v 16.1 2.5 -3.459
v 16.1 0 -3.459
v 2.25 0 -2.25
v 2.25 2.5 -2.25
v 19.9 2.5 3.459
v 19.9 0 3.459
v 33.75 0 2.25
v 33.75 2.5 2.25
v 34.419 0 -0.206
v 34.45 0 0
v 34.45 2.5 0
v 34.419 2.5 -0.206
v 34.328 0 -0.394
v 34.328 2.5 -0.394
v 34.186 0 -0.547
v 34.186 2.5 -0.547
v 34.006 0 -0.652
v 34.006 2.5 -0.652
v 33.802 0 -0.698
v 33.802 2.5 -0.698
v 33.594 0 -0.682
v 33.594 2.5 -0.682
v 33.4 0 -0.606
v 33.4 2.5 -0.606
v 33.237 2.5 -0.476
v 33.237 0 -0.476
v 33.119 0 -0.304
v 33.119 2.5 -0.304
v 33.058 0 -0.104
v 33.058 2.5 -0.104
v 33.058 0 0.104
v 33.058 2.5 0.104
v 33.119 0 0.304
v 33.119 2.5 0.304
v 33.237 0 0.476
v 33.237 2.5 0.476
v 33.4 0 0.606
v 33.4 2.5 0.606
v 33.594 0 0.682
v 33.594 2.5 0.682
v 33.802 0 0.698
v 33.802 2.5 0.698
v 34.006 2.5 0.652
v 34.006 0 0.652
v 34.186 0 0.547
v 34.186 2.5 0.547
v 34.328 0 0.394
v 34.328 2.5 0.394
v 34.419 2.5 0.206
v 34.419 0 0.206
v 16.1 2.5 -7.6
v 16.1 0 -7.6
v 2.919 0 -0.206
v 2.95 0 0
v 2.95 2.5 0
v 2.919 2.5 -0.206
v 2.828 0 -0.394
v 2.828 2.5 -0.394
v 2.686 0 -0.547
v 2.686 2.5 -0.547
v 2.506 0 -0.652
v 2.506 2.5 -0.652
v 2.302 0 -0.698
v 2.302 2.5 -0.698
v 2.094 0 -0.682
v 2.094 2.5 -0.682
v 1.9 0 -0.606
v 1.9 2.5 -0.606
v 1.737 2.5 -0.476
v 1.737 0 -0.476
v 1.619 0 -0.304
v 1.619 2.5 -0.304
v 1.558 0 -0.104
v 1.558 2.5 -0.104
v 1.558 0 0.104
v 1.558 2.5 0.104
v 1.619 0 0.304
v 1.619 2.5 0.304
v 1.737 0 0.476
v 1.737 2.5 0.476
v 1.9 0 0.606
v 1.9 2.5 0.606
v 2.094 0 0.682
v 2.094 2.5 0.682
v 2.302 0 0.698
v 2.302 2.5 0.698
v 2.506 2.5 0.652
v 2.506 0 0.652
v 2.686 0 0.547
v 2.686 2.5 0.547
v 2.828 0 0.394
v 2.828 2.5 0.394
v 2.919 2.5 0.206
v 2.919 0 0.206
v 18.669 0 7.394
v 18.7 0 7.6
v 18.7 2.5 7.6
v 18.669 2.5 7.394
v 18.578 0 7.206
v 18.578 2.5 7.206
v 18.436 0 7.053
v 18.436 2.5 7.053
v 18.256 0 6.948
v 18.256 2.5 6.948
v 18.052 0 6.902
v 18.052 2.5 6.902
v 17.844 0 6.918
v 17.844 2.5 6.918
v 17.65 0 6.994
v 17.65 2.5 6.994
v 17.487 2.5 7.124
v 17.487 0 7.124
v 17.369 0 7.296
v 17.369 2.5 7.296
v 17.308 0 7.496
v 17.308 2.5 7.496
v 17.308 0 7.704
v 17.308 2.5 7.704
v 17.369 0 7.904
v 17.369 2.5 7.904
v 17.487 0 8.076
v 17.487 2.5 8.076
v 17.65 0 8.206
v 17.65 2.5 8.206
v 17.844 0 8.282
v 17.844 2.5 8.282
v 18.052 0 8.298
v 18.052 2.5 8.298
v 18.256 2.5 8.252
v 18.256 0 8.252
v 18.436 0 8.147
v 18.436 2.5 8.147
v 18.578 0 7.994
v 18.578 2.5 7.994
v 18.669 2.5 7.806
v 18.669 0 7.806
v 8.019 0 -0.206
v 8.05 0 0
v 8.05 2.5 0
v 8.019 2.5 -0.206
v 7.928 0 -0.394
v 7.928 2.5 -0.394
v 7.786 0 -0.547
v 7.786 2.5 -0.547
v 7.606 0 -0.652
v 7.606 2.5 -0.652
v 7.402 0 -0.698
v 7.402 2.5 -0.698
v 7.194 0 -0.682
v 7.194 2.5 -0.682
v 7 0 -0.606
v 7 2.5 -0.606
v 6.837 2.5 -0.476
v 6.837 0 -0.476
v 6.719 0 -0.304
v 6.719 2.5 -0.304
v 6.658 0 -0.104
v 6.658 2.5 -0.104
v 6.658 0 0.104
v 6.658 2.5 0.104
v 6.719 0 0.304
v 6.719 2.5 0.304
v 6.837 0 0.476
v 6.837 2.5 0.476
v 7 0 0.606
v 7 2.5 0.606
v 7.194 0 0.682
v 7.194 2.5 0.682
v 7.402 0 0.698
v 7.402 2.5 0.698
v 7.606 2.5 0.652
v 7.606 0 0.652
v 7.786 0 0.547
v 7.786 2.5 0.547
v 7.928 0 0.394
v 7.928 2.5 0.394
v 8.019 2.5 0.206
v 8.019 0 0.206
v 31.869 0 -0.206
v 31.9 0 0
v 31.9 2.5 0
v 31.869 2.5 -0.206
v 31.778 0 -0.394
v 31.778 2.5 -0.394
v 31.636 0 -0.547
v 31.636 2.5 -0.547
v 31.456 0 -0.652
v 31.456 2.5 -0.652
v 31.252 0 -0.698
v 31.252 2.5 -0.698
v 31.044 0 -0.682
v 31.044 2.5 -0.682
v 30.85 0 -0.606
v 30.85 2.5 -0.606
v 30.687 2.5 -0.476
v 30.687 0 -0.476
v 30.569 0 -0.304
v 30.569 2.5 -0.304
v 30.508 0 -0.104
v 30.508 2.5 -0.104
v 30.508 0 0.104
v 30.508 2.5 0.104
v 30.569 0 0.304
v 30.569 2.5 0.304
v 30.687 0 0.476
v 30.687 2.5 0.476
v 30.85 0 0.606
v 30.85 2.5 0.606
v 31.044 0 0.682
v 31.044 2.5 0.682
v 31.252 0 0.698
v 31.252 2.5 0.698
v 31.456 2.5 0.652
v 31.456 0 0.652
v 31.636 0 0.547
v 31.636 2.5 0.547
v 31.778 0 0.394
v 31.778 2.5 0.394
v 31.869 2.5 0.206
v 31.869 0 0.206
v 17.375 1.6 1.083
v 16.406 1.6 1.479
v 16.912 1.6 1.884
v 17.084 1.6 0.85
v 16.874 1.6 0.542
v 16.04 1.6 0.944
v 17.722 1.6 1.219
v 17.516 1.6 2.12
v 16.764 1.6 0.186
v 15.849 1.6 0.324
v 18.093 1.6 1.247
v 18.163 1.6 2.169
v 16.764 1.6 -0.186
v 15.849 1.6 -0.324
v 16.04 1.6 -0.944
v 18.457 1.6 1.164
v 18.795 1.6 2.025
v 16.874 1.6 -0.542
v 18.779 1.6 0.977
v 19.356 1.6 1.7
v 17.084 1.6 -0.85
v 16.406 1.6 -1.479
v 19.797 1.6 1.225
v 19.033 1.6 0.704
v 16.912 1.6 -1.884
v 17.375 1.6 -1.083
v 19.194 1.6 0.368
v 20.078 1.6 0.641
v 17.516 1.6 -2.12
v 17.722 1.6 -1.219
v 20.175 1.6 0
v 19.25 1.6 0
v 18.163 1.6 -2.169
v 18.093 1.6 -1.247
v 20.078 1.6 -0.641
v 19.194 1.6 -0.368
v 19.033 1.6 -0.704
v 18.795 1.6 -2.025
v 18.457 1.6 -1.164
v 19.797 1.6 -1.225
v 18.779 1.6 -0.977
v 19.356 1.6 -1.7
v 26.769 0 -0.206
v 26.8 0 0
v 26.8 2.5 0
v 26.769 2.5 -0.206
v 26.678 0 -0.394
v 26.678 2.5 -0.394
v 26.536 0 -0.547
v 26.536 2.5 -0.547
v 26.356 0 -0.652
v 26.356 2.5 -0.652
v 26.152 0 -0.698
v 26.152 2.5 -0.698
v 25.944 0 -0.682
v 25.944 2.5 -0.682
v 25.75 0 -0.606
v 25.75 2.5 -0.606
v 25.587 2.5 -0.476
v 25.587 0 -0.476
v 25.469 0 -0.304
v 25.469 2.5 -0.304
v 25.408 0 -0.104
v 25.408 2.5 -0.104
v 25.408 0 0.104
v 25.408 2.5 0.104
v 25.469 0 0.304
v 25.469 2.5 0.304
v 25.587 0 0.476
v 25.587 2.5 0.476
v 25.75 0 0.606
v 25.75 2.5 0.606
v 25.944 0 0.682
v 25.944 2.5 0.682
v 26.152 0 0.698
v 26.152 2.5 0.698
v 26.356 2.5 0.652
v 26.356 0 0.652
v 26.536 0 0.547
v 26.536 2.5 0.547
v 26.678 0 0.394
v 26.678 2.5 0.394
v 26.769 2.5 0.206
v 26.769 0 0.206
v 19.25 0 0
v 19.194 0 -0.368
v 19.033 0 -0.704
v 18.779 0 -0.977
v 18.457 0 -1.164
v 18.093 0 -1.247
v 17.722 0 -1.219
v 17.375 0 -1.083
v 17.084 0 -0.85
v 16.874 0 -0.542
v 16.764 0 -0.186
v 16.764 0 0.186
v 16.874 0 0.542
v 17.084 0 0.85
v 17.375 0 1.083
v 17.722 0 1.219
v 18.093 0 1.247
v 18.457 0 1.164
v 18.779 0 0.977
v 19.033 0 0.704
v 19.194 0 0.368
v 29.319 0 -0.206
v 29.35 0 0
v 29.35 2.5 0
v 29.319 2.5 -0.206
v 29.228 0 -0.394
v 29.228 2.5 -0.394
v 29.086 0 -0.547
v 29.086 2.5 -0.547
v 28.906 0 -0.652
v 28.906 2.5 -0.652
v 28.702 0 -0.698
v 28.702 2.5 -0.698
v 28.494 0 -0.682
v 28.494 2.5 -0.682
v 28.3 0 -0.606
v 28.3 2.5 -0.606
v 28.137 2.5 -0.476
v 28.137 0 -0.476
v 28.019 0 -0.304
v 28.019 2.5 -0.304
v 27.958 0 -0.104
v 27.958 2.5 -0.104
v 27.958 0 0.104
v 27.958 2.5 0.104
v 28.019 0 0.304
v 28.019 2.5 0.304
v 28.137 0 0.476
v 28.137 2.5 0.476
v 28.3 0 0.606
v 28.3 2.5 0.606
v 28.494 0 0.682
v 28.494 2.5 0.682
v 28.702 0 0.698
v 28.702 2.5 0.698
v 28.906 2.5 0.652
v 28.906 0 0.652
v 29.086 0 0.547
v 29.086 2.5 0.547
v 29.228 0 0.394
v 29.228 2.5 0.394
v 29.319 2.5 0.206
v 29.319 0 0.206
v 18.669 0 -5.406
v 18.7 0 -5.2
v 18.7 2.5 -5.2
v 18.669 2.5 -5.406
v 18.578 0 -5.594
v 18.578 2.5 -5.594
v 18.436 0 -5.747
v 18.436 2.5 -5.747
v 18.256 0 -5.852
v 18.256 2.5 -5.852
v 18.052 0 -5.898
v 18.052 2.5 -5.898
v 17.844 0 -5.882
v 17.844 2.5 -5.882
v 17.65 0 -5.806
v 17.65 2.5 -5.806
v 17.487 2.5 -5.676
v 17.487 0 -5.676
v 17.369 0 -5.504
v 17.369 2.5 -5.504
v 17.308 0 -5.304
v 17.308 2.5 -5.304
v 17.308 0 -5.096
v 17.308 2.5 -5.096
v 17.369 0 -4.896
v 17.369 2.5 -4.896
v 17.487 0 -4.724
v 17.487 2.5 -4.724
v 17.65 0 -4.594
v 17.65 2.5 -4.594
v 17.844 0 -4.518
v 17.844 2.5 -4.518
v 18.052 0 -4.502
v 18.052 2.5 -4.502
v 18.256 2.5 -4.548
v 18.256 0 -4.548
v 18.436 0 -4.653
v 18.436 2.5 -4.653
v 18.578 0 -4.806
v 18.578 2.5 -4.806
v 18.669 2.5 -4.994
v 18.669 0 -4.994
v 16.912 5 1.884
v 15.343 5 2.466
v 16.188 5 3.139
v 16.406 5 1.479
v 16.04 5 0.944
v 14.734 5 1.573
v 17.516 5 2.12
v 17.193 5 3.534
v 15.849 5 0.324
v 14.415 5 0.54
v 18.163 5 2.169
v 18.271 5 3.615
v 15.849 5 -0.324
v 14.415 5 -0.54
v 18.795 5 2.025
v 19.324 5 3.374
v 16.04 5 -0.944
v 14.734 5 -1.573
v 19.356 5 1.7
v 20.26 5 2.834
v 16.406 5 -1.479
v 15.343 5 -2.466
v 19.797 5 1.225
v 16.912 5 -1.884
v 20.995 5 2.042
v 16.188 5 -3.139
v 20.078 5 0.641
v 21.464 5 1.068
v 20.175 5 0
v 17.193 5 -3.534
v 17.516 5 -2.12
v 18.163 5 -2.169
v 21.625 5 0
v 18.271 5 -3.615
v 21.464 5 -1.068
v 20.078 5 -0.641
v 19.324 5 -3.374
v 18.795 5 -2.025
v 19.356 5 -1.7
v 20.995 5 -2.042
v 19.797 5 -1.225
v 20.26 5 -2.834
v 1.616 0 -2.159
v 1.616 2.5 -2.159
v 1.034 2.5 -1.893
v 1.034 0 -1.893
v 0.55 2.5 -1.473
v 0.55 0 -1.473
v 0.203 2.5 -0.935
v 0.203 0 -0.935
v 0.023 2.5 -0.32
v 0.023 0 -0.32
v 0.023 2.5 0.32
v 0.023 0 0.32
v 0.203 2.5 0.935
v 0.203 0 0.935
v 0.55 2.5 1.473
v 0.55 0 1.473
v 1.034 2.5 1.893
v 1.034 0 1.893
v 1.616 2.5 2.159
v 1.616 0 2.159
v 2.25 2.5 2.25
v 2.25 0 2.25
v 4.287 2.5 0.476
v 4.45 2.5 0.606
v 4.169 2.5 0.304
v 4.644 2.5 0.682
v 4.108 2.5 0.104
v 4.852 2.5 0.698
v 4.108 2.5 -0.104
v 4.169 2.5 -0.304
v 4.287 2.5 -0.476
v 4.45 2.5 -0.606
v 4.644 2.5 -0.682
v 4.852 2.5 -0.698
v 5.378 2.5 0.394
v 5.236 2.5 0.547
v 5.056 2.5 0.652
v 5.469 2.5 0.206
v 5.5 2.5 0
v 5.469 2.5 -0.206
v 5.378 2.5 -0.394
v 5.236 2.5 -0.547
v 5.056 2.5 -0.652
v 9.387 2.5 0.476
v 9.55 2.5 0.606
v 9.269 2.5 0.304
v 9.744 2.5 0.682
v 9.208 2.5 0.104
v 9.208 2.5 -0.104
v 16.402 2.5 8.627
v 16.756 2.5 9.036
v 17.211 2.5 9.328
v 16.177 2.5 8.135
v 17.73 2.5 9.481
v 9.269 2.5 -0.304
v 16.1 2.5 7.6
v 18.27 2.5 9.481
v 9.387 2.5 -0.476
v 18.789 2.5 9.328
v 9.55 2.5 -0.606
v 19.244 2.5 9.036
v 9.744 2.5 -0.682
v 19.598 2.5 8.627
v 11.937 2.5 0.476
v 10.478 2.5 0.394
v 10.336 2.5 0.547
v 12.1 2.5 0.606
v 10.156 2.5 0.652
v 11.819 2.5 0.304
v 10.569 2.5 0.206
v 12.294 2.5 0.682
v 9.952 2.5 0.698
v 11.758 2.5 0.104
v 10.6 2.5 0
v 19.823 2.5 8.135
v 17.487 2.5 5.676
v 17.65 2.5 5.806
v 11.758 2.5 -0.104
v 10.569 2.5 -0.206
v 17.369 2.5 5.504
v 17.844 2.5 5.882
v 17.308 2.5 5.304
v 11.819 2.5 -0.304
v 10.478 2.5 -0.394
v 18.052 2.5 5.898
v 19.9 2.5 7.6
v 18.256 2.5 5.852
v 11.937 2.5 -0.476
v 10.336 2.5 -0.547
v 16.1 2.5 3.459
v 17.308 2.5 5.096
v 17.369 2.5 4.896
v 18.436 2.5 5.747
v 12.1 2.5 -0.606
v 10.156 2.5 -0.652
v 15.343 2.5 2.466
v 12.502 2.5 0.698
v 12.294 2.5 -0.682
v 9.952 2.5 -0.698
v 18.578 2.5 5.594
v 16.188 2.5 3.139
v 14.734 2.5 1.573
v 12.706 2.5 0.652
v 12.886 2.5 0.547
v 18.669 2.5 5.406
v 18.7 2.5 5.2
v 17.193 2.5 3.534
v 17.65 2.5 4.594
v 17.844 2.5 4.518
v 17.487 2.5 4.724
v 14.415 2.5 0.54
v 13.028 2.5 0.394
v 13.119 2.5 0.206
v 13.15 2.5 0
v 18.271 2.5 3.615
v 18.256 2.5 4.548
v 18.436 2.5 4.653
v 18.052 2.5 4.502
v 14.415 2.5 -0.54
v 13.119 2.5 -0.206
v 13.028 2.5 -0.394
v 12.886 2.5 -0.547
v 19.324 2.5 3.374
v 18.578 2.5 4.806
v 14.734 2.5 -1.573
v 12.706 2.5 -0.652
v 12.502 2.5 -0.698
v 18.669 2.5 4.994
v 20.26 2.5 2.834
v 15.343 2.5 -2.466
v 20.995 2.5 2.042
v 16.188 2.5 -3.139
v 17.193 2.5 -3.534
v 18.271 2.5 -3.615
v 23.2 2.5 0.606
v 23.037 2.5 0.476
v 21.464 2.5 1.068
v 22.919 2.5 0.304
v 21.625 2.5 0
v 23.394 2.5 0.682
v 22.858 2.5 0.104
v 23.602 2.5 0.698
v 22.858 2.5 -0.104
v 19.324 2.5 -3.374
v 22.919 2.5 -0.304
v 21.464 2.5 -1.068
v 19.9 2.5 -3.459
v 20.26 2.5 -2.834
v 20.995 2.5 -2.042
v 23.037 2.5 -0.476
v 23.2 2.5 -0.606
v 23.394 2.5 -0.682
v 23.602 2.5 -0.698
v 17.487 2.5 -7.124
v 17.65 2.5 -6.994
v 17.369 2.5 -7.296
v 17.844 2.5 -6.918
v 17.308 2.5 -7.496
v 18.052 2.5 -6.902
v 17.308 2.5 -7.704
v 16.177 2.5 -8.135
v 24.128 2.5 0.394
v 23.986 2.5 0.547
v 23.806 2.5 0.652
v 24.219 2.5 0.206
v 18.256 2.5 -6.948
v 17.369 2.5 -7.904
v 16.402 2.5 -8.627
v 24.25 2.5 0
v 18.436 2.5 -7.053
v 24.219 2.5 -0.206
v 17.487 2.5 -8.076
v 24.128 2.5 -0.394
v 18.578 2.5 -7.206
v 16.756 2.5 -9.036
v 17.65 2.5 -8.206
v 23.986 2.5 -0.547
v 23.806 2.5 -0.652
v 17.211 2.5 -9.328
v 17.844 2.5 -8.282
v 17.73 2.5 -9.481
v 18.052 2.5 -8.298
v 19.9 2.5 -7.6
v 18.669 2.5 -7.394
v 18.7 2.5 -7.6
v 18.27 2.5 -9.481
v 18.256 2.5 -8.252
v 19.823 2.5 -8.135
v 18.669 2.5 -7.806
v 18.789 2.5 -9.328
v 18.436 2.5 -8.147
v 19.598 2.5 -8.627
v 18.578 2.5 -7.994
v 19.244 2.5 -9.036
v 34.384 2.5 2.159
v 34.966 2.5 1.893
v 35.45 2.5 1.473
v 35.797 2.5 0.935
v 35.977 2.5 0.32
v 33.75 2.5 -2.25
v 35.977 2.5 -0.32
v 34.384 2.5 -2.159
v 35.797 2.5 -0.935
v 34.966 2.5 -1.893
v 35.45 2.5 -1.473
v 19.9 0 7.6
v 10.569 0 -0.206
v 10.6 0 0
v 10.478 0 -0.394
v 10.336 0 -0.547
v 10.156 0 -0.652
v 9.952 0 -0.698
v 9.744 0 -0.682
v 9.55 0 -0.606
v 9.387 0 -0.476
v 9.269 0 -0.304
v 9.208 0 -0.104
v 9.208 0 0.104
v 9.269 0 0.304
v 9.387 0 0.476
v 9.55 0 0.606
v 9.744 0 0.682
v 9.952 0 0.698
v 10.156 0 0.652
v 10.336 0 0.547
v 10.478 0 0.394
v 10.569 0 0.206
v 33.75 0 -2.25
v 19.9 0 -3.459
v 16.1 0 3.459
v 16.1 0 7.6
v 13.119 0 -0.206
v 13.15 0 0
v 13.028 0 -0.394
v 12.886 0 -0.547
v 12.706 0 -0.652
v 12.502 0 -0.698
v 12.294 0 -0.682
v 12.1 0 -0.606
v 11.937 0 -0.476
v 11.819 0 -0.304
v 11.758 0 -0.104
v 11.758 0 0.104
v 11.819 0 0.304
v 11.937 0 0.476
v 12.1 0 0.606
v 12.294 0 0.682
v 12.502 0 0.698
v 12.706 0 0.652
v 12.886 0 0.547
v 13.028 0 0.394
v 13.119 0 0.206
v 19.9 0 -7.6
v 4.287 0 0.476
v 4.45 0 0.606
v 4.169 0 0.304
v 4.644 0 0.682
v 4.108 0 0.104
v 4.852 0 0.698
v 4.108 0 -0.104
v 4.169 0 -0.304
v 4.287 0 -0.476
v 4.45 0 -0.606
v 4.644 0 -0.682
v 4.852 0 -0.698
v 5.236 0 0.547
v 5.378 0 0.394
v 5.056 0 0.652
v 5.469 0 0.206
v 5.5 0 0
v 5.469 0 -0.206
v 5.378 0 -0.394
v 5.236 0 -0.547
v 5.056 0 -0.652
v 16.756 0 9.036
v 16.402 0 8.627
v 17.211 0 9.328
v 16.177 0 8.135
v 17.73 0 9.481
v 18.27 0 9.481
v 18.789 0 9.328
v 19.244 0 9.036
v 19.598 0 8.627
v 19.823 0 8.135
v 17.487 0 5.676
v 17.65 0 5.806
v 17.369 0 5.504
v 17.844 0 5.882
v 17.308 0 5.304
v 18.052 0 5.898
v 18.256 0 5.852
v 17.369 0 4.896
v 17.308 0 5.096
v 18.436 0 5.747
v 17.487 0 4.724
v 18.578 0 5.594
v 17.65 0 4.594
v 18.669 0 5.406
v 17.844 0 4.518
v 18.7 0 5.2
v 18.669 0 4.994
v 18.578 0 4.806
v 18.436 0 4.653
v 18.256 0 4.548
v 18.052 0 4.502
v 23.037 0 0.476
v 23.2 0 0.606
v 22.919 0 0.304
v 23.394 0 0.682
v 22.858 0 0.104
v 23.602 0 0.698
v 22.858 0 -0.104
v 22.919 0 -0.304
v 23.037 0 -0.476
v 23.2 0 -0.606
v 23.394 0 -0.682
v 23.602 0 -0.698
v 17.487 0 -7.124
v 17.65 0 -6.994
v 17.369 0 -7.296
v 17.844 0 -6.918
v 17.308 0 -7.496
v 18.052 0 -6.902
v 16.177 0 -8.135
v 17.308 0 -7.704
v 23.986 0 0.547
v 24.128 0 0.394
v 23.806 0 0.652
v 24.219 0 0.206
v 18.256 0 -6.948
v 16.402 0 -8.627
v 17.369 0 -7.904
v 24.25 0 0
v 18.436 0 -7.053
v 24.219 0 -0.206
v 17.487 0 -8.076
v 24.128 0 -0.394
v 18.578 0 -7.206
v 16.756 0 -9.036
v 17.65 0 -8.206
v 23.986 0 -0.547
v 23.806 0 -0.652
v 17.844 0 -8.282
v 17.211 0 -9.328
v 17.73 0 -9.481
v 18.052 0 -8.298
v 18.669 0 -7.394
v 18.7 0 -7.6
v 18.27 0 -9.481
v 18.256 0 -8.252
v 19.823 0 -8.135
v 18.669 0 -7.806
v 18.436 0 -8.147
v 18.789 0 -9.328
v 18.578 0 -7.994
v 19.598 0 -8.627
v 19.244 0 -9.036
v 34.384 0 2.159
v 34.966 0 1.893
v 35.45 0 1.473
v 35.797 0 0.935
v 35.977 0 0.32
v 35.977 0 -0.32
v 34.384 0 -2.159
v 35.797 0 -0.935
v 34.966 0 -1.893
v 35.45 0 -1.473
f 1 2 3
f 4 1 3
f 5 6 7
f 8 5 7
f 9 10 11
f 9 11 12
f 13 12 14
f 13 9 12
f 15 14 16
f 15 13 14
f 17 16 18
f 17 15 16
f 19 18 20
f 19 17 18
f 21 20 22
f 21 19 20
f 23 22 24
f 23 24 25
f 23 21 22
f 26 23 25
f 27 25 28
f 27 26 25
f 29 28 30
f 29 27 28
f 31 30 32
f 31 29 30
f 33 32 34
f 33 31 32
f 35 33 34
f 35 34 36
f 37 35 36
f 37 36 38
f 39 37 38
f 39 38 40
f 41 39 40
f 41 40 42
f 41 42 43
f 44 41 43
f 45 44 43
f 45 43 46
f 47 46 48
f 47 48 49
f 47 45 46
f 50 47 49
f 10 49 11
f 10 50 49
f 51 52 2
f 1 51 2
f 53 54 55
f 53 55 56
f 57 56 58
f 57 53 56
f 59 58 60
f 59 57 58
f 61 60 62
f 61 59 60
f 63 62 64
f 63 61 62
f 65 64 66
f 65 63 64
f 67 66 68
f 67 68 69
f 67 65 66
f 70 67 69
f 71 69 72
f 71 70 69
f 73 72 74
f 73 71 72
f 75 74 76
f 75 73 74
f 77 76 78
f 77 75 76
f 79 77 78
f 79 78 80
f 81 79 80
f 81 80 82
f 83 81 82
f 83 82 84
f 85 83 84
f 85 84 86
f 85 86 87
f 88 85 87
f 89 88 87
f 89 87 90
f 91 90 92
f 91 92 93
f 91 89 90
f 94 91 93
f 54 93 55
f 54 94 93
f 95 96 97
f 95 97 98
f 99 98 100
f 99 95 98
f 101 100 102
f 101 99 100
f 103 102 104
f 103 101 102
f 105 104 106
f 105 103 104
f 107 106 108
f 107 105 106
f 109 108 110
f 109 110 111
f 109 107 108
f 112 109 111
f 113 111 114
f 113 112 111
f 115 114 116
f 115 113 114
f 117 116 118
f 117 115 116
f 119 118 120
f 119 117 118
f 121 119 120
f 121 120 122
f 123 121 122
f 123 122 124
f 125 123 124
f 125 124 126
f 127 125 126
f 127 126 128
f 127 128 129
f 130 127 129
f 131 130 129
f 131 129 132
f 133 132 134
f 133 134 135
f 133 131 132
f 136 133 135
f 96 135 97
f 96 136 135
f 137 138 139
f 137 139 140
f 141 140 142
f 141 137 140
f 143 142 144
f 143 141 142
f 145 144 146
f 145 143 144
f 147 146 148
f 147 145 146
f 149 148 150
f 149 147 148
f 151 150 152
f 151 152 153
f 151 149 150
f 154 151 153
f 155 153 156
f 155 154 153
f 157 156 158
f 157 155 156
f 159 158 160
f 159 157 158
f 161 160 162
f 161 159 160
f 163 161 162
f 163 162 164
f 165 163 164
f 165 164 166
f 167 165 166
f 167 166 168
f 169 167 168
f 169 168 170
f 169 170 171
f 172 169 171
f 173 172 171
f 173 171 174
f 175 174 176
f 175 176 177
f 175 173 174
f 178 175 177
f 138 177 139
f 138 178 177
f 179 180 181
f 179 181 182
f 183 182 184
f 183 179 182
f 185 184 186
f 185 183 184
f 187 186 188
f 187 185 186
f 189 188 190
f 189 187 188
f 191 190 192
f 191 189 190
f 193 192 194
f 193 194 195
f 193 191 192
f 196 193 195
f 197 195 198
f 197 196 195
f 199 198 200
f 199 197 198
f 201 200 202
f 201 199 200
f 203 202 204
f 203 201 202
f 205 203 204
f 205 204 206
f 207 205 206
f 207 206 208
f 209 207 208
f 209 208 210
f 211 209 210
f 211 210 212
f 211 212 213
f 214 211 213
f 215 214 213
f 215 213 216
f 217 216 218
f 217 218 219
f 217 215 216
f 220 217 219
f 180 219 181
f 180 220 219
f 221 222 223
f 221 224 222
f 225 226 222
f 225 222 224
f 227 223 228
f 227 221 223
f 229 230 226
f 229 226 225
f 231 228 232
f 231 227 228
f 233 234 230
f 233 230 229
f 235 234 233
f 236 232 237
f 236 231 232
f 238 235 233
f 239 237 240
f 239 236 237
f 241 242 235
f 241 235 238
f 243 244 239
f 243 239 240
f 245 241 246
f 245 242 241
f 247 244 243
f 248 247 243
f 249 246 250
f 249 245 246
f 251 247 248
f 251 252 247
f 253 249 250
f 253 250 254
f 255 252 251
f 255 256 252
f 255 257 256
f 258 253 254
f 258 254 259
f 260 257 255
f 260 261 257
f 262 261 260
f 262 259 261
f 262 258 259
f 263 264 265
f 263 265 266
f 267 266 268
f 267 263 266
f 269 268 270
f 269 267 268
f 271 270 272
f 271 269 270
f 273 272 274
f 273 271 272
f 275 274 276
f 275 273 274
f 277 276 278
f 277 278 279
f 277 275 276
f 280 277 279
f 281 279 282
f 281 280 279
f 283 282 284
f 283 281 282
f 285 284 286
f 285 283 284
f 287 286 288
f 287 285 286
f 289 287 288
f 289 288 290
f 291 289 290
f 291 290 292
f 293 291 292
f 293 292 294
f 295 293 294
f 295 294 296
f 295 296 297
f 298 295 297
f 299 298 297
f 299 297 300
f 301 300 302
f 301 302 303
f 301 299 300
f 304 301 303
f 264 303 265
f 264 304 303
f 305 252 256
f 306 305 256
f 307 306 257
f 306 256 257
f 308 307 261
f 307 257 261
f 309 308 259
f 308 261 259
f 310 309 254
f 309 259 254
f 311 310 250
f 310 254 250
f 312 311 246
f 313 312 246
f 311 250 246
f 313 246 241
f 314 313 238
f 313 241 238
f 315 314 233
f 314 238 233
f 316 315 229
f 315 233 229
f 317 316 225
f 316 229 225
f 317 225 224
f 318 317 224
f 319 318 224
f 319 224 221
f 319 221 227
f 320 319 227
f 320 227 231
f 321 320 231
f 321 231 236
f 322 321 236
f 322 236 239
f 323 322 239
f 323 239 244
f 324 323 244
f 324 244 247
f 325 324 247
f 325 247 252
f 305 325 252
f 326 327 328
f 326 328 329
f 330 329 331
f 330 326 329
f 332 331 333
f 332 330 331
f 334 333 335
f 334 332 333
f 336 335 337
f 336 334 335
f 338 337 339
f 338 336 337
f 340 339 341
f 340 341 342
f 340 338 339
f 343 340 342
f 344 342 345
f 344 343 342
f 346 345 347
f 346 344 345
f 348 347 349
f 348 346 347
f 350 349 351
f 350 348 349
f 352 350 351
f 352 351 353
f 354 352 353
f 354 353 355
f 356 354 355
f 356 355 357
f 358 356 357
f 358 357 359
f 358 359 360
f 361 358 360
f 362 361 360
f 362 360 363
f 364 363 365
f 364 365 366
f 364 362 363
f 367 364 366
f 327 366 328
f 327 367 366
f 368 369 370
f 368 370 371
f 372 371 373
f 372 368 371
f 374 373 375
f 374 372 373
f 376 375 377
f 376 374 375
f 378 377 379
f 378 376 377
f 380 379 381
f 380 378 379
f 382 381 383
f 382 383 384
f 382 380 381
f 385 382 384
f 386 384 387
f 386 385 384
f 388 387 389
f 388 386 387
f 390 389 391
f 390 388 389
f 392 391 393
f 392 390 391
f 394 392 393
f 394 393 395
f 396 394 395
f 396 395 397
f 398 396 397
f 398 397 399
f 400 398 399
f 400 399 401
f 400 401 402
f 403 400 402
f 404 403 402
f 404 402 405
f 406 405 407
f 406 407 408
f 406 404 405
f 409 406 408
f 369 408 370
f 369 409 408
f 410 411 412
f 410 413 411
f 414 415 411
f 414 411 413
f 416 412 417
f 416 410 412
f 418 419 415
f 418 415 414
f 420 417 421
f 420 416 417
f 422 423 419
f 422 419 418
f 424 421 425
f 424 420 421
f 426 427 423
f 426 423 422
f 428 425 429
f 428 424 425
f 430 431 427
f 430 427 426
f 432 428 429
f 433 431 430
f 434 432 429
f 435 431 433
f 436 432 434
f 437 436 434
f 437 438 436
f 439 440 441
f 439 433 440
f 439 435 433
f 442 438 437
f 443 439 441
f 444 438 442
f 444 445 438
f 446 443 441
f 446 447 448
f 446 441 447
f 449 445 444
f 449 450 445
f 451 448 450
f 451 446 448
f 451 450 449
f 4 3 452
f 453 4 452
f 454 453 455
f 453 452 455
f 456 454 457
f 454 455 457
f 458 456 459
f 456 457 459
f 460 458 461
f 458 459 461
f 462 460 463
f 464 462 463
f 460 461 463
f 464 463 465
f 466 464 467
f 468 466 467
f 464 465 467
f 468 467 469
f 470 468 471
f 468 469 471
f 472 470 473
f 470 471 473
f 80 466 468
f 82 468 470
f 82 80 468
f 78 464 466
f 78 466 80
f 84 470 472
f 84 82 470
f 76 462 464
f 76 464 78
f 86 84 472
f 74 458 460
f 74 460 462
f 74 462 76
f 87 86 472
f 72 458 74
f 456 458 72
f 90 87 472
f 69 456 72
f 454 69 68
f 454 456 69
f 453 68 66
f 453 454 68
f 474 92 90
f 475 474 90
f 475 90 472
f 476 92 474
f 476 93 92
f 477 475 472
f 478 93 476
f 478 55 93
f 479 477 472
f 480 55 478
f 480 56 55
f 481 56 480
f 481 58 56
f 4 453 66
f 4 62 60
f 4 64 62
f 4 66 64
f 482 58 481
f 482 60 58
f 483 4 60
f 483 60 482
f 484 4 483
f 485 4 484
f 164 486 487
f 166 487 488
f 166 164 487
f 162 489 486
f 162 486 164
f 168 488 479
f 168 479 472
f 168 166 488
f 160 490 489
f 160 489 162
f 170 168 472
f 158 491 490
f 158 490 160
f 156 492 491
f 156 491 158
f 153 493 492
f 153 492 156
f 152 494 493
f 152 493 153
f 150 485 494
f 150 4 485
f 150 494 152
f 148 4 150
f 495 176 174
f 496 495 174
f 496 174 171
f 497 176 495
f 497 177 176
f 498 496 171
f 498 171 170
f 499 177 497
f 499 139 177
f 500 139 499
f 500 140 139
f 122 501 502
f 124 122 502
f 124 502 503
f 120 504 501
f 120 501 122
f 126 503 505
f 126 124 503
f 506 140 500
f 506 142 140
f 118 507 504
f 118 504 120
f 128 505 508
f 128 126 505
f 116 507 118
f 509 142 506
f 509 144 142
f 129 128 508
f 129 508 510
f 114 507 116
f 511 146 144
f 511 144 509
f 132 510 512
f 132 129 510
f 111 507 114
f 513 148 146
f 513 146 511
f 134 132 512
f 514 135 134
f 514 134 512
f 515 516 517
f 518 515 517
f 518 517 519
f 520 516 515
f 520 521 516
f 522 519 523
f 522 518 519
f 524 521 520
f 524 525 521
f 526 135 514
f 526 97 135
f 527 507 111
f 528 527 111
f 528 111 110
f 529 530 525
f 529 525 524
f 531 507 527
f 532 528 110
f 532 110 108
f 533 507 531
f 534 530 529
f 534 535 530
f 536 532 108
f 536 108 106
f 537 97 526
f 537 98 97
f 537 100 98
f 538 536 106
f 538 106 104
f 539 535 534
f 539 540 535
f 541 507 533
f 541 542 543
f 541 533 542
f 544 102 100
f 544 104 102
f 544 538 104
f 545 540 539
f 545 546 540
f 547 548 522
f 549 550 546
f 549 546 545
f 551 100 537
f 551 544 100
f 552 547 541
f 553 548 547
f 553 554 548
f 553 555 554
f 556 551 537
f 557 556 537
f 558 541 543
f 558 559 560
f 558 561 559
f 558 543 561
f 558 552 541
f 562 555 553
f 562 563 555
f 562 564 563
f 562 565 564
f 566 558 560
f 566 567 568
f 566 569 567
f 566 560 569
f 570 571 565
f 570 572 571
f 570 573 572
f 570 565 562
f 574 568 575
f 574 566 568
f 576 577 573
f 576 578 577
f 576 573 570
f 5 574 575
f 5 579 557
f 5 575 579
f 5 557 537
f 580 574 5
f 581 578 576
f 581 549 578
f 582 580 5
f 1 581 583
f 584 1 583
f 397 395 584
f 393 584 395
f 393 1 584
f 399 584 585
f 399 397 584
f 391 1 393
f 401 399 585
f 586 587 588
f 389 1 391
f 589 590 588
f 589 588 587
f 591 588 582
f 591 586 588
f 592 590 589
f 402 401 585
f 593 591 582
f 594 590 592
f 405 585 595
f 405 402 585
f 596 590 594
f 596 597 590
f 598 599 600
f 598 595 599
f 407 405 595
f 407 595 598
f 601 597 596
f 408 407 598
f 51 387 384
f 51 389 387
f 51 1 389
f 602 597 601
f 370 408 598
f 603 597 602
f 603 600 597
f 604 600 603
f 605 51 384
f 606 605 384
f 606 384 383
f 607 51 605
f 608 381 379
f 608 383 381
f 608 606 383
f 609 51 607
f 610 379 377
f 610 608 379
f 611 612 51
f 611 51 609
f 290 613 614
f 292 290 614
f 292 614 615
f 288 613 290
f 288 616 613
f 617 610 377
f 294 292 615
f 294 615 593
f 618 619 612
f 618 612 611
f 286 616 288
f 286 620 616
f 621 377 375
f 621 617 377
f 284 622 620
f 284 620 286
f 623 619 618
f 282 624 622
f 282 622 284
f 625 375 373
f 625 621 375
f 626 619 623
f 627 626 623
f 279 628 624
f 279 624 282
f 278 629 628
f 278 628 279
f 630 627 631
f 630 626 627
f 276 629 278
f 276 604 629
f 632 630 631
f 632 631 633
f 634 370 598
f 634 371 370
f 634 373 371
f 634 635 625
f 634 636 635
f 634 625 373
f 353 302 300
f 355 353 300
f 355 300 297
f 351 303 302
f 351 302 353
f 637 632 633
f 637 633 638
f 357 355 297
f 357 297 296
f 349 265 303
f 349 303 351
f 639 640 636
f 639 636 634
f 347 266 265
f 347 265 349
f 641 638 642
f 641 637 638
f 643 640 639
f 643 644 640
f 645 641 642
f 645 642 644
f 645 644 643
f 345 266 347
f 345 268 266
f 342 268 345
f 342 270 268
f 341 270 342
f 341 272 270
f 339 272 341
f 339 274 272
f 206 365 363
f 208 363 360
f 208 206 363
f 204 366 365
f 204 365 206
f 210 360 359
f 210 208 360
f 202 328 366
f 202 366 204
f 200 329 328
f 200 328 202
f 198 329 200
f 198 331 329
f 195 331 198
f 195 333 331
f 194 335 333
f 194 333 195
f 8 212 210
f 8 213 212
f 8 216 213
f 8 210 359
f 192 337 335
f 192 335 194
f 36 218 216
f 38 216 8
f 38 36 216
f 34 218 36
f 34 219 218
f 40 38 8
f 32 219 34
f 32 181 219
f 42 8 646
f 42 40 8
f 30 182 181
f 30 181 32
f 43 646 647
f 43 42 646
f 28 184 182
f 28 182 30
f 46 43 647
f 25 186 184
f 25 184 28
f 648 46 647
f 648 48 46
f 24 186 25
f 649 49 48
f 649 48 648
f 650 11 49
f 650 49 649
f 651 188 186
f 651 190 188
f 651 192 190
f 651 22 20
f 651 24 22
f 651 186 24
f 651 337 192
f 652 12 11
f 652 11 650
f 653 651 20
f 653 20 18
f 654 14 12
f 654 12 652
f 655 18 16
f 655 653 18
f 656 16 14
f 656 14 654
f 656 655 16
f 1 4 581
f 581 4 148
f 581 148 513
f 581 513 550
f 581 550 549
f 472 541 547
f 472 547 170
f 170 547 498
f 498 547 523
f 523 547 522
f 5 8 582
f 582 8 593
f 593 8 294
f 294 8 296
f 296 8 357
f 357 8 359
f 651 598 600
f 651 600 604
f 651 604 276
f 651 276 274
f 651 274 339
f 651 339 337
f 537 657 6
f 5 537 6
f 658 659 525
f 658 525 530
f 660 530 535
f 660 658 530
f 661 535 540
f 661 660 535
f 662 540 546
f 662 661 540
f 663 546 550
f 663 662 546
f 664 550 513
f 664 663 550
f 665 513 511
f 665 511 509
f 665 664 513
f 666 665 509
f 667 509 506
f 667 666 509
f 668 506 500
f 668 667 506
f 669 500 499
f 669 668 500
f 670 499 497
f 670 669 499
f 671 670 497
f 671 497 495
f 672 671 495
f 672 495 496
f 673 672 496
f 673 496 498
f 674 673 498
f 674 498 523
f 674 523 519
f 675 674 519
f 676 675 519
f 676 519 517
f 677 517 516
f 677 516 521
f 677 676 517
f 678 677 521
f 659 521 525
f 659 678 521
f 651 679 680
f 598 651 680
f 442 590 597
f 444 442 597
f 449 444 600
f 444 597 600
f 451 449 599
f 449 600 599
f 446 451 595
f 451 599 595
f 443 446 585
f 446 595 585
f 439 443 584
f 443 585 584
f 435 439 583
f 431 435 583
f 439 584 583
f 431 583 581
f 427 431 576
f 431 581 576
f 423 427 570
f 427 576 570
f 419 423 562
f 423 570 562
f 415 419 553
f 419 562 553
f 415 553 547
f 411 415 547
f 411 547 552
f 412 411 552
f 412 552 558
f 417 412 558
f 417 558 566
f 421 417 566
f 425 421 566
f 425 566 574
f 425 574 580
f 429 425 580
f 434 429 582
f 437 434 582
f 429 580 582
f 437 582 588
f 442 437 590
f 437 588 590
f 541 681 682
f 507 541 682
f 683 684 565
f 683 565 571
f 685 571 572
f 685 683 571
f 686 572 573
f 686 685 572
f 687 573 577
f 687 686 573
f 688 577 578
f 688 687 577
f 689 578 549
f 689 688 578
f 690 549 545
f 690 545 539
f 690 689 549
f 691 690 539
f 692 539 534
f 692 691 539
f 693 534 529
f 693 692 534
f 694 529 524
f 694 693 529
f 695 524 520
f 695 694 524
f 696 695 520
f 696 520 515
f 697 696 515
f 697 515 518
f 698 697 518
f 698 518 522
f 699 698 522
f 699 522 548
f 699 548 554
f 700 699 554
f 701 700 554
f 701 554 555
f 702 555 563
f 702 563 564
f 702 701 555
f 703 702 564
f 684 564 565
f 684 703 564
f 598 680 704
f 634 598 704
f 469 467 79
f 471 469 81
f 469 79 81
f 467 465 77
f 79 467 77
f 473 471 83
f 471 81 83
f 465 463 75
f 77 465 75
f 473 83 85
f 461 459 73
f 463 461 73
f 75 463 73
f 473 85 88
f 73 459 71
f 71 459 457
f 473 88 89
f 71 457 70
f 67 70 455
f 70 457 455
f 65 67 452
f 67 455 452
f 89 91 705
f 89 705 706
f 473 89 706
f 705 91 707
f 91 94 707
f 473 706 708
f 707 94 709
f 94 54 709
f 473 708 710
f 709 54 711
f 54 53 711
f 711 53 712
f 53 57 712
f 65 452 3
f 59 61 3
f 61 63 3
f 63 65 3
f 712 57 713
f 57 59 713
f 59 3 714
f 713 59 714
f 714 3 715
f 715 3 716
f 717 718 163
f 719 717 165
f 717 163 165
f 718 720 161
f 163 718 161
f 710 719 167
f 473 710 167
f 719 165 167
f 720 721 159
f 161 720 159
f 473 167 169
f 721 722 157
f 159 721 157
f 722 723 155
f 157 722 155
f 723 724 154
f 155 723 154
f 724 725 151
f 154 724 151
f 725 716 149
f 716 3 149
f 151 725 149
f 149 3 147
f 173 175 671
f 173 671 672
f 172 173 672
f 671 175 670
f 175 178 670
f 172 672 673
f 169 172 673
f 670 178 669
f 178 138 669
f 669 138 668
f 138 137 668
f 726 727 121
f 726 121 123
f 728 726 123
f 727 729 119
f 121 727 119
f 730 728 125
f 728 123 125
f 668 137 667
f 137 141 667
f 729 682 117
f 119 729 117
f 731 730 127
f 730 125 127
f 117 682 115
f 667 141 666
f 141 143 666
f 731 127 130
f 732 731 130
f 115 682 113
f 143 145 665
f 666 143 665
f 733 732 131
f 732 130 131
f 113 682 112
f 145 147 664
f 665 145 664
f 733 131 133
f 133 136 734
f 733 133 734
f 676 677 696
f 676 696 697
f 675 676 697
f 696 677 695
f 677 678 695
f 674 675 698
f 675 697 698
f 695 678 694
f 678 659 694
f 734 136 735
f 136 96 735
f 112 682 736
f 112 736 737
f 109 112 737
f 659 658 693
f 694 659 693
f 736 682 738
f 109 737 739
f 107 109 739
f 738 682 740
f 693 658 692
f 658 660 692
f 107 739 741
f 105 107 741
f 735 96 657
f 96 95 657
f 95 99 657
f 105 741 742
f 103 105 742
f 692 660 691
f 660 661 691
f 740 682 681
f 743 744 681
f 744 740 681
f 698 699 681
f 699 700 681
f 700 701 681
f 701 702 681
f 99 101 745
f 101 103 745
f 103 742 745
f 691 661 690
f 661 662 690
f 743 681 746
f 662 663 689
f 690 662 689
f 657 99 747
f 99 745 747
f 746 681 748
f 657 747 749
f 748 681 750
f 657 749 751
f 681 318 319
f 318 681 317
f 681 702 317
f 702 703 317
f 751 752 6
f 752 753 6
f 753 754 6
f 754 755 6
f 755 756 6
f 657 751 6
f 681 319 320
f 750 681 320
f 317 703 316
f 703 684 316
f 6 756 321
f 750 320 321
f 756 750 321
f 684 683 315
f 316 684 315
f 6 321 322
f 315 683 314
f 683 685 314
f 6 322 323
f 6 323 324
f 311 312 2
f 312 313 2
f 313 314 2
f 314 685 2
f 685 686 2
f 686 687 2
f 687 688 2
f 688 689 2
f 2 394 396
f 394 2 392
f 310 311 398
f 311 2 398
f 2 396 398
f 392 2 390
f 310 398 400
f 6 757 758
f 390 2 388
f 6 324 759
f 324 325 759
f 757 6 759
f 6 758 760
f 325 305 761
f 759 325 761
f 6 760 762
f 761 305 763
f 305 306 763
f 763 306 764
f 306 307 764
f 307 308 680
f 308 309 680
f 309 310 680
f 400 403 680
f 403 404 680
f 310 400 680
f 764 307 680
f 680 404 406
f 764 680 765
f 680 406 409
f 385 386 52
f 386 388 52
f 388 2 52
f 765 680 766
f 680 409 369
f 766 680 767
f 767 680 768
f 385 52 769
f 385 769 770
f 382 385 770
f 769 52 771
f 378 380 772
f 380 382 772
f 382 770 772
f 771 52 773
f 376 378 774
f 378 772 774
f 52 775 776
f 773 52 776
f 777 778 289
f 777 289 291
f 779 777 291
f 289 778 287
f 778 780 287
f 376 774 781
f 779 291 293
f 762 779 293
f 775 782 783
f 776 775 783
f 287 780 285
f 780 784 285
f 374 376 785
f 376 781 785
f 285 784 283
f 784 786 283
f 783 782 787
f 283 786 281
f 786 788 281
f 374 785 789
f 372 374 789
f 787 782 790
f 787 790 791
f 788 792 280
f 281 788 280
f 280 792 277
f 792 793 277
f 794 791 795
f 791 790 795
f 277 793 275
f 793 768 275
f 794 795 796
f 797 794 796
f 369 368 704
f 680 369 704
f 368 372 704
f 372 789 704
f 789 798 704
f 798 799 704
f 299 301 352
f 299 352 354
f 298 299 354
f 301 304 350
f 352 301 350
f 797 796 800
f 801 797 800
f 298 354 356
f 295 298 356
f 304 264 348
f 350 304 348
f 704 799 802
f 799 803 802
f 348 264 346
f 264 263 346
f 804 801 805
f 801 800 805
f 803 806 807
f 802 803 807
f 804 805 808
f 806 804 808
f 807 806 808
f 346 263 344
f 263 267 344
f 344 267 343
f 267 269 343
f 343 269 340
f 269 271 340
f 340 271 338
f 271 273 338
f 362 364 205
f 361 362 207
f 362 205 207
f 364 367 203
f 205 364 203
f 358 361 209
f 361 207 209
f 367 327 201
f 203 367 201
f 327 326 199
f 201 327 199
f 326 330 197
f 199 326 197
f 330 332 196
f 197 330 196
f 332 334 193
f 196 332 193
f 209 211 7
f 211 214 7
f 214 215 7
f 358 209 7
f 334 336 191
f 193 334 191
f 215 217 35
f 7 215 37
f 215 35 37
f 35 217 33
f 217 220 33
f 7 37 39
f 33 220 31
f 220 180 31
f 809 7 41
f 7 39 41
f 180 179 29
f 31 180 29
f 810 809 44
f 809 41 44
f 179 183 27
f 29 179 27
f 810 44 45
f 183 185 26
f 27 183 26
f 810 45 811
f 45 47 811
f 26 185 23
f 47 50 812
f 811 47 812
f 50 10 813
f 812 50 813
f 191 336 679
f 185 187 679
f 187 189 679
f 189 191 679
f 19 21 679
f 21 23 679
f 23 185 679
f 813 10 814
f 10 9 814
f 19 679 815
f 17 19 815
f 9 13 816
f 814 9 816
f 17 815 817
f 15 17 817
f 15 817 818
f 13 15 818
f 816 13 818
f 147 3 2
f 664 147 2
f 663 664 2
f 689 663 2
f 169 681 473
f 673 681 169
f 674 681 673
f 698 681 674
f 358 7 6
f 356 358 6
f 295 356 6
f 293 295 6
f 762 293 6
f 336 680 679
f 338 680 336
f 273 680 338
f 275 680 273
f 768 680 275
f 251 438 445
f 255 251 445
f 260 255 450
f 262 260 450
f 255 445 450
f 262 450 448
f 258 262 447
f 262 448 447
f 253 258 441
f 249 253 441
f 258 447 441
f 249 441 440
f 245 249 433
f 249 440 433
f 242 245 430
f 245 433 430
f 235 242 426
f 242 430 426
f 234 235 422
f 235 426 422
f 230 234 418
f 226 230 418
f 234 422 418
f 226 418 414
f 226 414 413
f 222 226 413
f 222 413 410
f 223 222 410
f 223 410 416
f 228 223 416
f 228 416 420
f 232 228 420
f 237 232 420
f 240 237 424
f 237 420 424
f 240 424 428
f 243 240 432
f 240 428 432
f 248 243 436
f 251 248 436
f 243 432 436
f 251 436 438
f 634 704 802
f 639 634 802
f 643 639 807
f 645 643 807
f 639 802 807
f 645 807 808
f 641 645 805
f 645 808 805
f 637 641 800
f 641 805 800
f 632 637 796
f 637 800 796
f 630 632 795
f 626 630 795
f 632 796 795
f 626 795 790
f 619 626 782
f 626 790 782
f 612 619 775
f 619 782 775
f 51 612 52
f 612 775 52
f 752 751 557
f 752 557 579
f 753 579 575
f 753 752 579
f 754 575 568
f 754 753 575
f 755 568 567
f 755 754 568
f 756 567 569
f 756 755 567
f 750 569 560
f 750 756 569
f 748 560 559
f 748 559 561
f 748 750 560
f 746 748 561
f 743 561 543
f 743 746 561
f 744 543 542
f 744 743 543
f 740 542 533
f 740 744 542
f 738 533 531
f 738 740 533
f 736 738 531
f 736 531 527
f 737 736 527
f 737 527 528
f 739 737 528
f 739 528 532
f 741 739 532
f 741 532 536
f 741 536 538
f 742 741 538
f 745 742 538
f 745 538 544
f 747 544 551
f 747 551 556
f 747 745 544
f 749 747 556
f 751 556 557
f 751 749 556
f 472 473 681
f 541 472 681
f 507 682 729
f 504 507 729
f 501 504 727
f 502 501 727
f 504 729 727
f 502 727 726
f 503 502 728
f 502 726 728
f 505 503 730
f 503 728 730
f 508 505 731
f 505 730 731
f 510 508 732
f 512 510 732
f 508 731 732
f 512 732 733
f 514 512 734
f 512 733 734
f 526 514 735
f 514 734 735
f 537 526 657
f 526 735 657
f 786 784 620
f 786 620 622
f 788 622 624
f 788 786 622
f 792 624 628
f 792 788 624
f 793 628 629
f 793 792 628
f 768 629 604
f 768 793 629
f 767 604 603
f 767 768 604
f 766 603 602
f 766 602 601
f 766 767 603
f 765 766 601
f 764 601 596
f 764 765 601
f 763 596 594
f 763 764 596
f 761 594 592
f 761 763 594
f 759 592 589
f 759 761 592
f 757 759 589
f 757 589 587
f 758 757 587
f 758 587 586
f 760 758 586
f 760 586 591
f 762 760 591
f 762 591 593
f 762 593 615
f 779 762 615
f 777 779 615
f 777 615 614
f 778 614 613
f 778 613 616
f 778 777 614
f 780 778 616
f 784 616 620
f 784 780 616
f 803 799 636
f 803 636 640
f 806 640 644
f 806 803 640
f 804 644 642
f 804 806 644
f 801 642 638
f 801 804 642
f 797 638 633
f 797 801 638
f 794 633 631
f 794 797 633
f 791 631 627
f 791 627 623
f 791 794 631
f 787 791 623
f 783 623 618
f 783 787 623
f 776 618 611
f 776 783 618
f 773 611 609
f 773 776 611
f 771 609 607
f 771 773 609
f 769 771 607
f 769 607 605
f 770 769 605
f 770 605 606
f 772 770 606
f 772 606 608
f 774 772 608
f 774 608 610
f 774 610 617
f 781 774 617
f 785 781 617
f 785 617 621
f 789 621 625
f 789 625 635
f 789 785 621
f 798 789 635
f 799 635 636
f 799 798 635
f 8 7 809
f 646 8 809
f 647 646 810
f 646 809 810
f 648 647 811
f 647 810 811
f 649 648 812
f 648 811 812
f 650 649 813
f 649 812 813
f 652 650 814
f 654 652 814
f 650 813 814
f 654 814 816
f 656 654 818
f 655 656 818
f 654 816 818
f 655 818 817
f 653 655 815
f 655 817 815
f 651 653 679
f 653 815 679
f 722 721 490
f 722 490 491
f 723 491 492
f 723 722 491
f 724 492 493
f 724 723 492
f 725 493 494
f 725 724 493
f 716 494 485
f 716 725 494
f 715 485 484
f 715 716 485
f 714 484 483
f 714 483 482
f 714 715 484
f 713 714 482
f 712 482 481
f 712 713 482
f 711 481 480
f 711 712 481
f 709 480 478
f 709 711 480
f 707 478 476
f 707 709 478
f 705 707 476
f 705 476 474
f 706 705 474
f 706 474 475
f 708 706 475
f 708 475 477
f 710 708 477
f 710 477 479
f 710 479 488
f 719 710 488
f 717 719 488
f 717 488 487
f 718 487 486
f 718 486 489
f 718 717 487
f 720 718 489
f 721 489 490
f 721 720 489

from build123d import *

# Parameters (mm, degrees)
SKETCH6_R           = 0.7
BOSS_EXTRUDE3_DEPTH = 2.5
SKETCH7_R           = 3.625
BOSS_EXTRUDE4_DEPTH = 2.5
SKETCH8_R           = 2.175
CUT_EXTRUDE3_DEPTH  = 3.4
CUT_EXTRUDE4_REACH  = 3.6
SKETCH9_R           = 1.25


with BuildPart() as part:
    # Sketch6 → Boss-Extrude3 (new body)
    with BuildSketch(Plane(origin=(0, 0, 0), x_dir=(1, 0, 0), z_dir=(0, 1, 0))):
        with BuildLine():
            Line((16.1, 7.6), (16.1, 3.459126984))
            Line((16.1, 3.459126984), (2.25, 2.25))
            ThreePointArc((2.25, 2.25), (0, 0), (2.25, -2.25))
            Line((2.25, -2.25), (16.1, -3.459126984))
            Line((16.1, -3.459126984), (16.1, -7.6))
            ThreePointArc((16.1, -7.6), (18, -9.5), (19.9, -7.6))
            Line((19.9, -7.6), (19.9, -3.459126984))
            Line((19.9, -3.459126984), (33.75, -2.25))
            ThreePointArc((33.75, -2.25), (36, 0), (33.75, 2.25))
            Line((33.75, 2.25), (19.9, 3.459126984))
            Line((19.9, 3.459126984), (19.9, 7.6))
            ThreePointArc((19.9, 7.6), (18, 9.5), (16.1, 7.6))
        make_face()
        with Locations((33.75, 0)):
            Circle(SKETCH6_R, mode=Mode.SUBTRACT)
        with Locations((31.2, 0)):
            Circle(SKETCH6_R, mode=Mode.SUBTRACT)
        with Locations((28.65, 0)):
            Circle(SKETCH6_R, mode=Mode.SUBTRACT)
        with Locations((26.1, 0)):
            Circle(SKETCH6_R, mode=Mode.SUBTRACT)
        with Locations((23.55, 0)):
            Circle(SKETCH6_R, mode=Mode.SUBTRACT)
        with Locations((18, -7.6)):
            Circle(SKETCH6_R, mode=Mode.SUBTRACT)
        with Locations((18, -5.2)):
            Circle(SKETCH6_R, mode=Mode.SUBTRACT)
        with Locations((12.45, 0)):
            Circle(SKETCH6_R, mode=Mode.SUBTRACT)
        with Locations((9.9, 0)):
            Circle(SKETCH6_R, mode=Mode.SUBTRACT)
        with Locations((7.35, 0)):
            Circle(SKETCH6_R, mode=Mode.SUBTRACT)
        with Locations((4.8, 0)):
            Circle(SKETCH6_R, mode=Mode.SUBTRACT)
        with Locations((2.25, 0)):
            Circle(SKETCH6_R, mode=Mode.SUBTRACT)
        with Locations((18, 5.2)):
            Circle(SKETCH6_R, mode=Mode.SUBTRACT)
        with Locations((18, 7.6)):
            Circle(SKETCH6_R, mode=Mode.SUBTRACT)
    extrude(amount=BOSS_EXTRUDE3_DEPTH)

    # Sketch7 → Boss-Extrude4 (add)
    with BuildSketch(Plane(origin=(0, 2.5, 0), x_dir=(1, 0, 0), z_dir=(0, 1, 0))):
        with Locations((18, 0)):
            Circle(SKETCH7_R)
    extrude(amount=BOSS_EXTRUDE4_DEPTH)

    # Sketch8 → Cut-Extrude3 (cut)
    with BuildSketch(Plane(origin=(0, 5, 0), x_dir=(1, 0, 0), z_dir=(0, 1, 0))):
        with Locations((18, 0)):
            Circle(SKETCH8_R)
    extrude(amount=-CUT_EXTRUDE3_DEPTH, mode=Mode.SUBTRACT)

    # Sketch9 → Cut-Extrude4 (cut, up to next)
    with BuildSketch(Plane(origin=(0, 1.6, 0), x_dir=(1, 0, 0), z_dir=(0, 1, 0)), mode=Mode.PRIVATE) as cut_extrude4_sk1:
        with Locations((18, 0)):
            Circle(SKETCH9_R)
    cut_extrude4_tool1 = extrude(cut_extrude4_sk1.sketch, amount=-CUT_EXTRUDE4_REACH, mode=Mode.PRIVATE) & part.part
    add(cut_extrude4_tool1.solids().sort_by_distance((18, 1.6, 0))[0], mode=Mode.SUBTRACT)


solid = part.part
